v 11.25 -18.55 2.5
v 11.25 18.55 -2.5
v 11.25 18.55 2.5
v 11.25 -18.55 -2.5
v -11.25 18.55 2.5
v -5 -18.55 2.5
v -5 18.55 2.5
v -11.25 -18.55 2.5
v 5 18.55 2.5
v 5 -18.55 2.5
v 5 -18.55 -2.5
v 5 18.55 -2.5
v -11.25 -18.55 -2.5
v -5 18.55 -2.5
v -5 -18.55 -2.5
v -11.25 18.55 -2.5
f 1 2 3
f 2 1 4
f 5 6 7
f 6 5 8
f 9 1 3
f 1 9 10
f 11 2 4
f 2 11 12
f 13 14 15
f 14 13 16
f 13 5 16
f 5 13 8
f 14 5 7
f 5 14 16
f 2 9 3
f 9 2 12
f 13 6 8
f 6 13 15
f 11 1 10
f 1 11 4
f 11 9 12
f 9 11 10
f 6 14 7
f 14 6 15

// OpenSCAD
module nano_connector_footprint(thickness)
{
	nano_length_max=43.6;
	nano_connectors_length = 37.1;
	nano_width_with_connectors = 22.5;
	nano_internal_width = 10;

	difference(){
			cube(size=[nano_width_with_connectors,nano_connectors_length,thickness], center=true);
		 	cube(size=[nano_internal_width,nano_connectors_length,2*thickness], center=true);
	}
}

nano_connector_footprint(5);
